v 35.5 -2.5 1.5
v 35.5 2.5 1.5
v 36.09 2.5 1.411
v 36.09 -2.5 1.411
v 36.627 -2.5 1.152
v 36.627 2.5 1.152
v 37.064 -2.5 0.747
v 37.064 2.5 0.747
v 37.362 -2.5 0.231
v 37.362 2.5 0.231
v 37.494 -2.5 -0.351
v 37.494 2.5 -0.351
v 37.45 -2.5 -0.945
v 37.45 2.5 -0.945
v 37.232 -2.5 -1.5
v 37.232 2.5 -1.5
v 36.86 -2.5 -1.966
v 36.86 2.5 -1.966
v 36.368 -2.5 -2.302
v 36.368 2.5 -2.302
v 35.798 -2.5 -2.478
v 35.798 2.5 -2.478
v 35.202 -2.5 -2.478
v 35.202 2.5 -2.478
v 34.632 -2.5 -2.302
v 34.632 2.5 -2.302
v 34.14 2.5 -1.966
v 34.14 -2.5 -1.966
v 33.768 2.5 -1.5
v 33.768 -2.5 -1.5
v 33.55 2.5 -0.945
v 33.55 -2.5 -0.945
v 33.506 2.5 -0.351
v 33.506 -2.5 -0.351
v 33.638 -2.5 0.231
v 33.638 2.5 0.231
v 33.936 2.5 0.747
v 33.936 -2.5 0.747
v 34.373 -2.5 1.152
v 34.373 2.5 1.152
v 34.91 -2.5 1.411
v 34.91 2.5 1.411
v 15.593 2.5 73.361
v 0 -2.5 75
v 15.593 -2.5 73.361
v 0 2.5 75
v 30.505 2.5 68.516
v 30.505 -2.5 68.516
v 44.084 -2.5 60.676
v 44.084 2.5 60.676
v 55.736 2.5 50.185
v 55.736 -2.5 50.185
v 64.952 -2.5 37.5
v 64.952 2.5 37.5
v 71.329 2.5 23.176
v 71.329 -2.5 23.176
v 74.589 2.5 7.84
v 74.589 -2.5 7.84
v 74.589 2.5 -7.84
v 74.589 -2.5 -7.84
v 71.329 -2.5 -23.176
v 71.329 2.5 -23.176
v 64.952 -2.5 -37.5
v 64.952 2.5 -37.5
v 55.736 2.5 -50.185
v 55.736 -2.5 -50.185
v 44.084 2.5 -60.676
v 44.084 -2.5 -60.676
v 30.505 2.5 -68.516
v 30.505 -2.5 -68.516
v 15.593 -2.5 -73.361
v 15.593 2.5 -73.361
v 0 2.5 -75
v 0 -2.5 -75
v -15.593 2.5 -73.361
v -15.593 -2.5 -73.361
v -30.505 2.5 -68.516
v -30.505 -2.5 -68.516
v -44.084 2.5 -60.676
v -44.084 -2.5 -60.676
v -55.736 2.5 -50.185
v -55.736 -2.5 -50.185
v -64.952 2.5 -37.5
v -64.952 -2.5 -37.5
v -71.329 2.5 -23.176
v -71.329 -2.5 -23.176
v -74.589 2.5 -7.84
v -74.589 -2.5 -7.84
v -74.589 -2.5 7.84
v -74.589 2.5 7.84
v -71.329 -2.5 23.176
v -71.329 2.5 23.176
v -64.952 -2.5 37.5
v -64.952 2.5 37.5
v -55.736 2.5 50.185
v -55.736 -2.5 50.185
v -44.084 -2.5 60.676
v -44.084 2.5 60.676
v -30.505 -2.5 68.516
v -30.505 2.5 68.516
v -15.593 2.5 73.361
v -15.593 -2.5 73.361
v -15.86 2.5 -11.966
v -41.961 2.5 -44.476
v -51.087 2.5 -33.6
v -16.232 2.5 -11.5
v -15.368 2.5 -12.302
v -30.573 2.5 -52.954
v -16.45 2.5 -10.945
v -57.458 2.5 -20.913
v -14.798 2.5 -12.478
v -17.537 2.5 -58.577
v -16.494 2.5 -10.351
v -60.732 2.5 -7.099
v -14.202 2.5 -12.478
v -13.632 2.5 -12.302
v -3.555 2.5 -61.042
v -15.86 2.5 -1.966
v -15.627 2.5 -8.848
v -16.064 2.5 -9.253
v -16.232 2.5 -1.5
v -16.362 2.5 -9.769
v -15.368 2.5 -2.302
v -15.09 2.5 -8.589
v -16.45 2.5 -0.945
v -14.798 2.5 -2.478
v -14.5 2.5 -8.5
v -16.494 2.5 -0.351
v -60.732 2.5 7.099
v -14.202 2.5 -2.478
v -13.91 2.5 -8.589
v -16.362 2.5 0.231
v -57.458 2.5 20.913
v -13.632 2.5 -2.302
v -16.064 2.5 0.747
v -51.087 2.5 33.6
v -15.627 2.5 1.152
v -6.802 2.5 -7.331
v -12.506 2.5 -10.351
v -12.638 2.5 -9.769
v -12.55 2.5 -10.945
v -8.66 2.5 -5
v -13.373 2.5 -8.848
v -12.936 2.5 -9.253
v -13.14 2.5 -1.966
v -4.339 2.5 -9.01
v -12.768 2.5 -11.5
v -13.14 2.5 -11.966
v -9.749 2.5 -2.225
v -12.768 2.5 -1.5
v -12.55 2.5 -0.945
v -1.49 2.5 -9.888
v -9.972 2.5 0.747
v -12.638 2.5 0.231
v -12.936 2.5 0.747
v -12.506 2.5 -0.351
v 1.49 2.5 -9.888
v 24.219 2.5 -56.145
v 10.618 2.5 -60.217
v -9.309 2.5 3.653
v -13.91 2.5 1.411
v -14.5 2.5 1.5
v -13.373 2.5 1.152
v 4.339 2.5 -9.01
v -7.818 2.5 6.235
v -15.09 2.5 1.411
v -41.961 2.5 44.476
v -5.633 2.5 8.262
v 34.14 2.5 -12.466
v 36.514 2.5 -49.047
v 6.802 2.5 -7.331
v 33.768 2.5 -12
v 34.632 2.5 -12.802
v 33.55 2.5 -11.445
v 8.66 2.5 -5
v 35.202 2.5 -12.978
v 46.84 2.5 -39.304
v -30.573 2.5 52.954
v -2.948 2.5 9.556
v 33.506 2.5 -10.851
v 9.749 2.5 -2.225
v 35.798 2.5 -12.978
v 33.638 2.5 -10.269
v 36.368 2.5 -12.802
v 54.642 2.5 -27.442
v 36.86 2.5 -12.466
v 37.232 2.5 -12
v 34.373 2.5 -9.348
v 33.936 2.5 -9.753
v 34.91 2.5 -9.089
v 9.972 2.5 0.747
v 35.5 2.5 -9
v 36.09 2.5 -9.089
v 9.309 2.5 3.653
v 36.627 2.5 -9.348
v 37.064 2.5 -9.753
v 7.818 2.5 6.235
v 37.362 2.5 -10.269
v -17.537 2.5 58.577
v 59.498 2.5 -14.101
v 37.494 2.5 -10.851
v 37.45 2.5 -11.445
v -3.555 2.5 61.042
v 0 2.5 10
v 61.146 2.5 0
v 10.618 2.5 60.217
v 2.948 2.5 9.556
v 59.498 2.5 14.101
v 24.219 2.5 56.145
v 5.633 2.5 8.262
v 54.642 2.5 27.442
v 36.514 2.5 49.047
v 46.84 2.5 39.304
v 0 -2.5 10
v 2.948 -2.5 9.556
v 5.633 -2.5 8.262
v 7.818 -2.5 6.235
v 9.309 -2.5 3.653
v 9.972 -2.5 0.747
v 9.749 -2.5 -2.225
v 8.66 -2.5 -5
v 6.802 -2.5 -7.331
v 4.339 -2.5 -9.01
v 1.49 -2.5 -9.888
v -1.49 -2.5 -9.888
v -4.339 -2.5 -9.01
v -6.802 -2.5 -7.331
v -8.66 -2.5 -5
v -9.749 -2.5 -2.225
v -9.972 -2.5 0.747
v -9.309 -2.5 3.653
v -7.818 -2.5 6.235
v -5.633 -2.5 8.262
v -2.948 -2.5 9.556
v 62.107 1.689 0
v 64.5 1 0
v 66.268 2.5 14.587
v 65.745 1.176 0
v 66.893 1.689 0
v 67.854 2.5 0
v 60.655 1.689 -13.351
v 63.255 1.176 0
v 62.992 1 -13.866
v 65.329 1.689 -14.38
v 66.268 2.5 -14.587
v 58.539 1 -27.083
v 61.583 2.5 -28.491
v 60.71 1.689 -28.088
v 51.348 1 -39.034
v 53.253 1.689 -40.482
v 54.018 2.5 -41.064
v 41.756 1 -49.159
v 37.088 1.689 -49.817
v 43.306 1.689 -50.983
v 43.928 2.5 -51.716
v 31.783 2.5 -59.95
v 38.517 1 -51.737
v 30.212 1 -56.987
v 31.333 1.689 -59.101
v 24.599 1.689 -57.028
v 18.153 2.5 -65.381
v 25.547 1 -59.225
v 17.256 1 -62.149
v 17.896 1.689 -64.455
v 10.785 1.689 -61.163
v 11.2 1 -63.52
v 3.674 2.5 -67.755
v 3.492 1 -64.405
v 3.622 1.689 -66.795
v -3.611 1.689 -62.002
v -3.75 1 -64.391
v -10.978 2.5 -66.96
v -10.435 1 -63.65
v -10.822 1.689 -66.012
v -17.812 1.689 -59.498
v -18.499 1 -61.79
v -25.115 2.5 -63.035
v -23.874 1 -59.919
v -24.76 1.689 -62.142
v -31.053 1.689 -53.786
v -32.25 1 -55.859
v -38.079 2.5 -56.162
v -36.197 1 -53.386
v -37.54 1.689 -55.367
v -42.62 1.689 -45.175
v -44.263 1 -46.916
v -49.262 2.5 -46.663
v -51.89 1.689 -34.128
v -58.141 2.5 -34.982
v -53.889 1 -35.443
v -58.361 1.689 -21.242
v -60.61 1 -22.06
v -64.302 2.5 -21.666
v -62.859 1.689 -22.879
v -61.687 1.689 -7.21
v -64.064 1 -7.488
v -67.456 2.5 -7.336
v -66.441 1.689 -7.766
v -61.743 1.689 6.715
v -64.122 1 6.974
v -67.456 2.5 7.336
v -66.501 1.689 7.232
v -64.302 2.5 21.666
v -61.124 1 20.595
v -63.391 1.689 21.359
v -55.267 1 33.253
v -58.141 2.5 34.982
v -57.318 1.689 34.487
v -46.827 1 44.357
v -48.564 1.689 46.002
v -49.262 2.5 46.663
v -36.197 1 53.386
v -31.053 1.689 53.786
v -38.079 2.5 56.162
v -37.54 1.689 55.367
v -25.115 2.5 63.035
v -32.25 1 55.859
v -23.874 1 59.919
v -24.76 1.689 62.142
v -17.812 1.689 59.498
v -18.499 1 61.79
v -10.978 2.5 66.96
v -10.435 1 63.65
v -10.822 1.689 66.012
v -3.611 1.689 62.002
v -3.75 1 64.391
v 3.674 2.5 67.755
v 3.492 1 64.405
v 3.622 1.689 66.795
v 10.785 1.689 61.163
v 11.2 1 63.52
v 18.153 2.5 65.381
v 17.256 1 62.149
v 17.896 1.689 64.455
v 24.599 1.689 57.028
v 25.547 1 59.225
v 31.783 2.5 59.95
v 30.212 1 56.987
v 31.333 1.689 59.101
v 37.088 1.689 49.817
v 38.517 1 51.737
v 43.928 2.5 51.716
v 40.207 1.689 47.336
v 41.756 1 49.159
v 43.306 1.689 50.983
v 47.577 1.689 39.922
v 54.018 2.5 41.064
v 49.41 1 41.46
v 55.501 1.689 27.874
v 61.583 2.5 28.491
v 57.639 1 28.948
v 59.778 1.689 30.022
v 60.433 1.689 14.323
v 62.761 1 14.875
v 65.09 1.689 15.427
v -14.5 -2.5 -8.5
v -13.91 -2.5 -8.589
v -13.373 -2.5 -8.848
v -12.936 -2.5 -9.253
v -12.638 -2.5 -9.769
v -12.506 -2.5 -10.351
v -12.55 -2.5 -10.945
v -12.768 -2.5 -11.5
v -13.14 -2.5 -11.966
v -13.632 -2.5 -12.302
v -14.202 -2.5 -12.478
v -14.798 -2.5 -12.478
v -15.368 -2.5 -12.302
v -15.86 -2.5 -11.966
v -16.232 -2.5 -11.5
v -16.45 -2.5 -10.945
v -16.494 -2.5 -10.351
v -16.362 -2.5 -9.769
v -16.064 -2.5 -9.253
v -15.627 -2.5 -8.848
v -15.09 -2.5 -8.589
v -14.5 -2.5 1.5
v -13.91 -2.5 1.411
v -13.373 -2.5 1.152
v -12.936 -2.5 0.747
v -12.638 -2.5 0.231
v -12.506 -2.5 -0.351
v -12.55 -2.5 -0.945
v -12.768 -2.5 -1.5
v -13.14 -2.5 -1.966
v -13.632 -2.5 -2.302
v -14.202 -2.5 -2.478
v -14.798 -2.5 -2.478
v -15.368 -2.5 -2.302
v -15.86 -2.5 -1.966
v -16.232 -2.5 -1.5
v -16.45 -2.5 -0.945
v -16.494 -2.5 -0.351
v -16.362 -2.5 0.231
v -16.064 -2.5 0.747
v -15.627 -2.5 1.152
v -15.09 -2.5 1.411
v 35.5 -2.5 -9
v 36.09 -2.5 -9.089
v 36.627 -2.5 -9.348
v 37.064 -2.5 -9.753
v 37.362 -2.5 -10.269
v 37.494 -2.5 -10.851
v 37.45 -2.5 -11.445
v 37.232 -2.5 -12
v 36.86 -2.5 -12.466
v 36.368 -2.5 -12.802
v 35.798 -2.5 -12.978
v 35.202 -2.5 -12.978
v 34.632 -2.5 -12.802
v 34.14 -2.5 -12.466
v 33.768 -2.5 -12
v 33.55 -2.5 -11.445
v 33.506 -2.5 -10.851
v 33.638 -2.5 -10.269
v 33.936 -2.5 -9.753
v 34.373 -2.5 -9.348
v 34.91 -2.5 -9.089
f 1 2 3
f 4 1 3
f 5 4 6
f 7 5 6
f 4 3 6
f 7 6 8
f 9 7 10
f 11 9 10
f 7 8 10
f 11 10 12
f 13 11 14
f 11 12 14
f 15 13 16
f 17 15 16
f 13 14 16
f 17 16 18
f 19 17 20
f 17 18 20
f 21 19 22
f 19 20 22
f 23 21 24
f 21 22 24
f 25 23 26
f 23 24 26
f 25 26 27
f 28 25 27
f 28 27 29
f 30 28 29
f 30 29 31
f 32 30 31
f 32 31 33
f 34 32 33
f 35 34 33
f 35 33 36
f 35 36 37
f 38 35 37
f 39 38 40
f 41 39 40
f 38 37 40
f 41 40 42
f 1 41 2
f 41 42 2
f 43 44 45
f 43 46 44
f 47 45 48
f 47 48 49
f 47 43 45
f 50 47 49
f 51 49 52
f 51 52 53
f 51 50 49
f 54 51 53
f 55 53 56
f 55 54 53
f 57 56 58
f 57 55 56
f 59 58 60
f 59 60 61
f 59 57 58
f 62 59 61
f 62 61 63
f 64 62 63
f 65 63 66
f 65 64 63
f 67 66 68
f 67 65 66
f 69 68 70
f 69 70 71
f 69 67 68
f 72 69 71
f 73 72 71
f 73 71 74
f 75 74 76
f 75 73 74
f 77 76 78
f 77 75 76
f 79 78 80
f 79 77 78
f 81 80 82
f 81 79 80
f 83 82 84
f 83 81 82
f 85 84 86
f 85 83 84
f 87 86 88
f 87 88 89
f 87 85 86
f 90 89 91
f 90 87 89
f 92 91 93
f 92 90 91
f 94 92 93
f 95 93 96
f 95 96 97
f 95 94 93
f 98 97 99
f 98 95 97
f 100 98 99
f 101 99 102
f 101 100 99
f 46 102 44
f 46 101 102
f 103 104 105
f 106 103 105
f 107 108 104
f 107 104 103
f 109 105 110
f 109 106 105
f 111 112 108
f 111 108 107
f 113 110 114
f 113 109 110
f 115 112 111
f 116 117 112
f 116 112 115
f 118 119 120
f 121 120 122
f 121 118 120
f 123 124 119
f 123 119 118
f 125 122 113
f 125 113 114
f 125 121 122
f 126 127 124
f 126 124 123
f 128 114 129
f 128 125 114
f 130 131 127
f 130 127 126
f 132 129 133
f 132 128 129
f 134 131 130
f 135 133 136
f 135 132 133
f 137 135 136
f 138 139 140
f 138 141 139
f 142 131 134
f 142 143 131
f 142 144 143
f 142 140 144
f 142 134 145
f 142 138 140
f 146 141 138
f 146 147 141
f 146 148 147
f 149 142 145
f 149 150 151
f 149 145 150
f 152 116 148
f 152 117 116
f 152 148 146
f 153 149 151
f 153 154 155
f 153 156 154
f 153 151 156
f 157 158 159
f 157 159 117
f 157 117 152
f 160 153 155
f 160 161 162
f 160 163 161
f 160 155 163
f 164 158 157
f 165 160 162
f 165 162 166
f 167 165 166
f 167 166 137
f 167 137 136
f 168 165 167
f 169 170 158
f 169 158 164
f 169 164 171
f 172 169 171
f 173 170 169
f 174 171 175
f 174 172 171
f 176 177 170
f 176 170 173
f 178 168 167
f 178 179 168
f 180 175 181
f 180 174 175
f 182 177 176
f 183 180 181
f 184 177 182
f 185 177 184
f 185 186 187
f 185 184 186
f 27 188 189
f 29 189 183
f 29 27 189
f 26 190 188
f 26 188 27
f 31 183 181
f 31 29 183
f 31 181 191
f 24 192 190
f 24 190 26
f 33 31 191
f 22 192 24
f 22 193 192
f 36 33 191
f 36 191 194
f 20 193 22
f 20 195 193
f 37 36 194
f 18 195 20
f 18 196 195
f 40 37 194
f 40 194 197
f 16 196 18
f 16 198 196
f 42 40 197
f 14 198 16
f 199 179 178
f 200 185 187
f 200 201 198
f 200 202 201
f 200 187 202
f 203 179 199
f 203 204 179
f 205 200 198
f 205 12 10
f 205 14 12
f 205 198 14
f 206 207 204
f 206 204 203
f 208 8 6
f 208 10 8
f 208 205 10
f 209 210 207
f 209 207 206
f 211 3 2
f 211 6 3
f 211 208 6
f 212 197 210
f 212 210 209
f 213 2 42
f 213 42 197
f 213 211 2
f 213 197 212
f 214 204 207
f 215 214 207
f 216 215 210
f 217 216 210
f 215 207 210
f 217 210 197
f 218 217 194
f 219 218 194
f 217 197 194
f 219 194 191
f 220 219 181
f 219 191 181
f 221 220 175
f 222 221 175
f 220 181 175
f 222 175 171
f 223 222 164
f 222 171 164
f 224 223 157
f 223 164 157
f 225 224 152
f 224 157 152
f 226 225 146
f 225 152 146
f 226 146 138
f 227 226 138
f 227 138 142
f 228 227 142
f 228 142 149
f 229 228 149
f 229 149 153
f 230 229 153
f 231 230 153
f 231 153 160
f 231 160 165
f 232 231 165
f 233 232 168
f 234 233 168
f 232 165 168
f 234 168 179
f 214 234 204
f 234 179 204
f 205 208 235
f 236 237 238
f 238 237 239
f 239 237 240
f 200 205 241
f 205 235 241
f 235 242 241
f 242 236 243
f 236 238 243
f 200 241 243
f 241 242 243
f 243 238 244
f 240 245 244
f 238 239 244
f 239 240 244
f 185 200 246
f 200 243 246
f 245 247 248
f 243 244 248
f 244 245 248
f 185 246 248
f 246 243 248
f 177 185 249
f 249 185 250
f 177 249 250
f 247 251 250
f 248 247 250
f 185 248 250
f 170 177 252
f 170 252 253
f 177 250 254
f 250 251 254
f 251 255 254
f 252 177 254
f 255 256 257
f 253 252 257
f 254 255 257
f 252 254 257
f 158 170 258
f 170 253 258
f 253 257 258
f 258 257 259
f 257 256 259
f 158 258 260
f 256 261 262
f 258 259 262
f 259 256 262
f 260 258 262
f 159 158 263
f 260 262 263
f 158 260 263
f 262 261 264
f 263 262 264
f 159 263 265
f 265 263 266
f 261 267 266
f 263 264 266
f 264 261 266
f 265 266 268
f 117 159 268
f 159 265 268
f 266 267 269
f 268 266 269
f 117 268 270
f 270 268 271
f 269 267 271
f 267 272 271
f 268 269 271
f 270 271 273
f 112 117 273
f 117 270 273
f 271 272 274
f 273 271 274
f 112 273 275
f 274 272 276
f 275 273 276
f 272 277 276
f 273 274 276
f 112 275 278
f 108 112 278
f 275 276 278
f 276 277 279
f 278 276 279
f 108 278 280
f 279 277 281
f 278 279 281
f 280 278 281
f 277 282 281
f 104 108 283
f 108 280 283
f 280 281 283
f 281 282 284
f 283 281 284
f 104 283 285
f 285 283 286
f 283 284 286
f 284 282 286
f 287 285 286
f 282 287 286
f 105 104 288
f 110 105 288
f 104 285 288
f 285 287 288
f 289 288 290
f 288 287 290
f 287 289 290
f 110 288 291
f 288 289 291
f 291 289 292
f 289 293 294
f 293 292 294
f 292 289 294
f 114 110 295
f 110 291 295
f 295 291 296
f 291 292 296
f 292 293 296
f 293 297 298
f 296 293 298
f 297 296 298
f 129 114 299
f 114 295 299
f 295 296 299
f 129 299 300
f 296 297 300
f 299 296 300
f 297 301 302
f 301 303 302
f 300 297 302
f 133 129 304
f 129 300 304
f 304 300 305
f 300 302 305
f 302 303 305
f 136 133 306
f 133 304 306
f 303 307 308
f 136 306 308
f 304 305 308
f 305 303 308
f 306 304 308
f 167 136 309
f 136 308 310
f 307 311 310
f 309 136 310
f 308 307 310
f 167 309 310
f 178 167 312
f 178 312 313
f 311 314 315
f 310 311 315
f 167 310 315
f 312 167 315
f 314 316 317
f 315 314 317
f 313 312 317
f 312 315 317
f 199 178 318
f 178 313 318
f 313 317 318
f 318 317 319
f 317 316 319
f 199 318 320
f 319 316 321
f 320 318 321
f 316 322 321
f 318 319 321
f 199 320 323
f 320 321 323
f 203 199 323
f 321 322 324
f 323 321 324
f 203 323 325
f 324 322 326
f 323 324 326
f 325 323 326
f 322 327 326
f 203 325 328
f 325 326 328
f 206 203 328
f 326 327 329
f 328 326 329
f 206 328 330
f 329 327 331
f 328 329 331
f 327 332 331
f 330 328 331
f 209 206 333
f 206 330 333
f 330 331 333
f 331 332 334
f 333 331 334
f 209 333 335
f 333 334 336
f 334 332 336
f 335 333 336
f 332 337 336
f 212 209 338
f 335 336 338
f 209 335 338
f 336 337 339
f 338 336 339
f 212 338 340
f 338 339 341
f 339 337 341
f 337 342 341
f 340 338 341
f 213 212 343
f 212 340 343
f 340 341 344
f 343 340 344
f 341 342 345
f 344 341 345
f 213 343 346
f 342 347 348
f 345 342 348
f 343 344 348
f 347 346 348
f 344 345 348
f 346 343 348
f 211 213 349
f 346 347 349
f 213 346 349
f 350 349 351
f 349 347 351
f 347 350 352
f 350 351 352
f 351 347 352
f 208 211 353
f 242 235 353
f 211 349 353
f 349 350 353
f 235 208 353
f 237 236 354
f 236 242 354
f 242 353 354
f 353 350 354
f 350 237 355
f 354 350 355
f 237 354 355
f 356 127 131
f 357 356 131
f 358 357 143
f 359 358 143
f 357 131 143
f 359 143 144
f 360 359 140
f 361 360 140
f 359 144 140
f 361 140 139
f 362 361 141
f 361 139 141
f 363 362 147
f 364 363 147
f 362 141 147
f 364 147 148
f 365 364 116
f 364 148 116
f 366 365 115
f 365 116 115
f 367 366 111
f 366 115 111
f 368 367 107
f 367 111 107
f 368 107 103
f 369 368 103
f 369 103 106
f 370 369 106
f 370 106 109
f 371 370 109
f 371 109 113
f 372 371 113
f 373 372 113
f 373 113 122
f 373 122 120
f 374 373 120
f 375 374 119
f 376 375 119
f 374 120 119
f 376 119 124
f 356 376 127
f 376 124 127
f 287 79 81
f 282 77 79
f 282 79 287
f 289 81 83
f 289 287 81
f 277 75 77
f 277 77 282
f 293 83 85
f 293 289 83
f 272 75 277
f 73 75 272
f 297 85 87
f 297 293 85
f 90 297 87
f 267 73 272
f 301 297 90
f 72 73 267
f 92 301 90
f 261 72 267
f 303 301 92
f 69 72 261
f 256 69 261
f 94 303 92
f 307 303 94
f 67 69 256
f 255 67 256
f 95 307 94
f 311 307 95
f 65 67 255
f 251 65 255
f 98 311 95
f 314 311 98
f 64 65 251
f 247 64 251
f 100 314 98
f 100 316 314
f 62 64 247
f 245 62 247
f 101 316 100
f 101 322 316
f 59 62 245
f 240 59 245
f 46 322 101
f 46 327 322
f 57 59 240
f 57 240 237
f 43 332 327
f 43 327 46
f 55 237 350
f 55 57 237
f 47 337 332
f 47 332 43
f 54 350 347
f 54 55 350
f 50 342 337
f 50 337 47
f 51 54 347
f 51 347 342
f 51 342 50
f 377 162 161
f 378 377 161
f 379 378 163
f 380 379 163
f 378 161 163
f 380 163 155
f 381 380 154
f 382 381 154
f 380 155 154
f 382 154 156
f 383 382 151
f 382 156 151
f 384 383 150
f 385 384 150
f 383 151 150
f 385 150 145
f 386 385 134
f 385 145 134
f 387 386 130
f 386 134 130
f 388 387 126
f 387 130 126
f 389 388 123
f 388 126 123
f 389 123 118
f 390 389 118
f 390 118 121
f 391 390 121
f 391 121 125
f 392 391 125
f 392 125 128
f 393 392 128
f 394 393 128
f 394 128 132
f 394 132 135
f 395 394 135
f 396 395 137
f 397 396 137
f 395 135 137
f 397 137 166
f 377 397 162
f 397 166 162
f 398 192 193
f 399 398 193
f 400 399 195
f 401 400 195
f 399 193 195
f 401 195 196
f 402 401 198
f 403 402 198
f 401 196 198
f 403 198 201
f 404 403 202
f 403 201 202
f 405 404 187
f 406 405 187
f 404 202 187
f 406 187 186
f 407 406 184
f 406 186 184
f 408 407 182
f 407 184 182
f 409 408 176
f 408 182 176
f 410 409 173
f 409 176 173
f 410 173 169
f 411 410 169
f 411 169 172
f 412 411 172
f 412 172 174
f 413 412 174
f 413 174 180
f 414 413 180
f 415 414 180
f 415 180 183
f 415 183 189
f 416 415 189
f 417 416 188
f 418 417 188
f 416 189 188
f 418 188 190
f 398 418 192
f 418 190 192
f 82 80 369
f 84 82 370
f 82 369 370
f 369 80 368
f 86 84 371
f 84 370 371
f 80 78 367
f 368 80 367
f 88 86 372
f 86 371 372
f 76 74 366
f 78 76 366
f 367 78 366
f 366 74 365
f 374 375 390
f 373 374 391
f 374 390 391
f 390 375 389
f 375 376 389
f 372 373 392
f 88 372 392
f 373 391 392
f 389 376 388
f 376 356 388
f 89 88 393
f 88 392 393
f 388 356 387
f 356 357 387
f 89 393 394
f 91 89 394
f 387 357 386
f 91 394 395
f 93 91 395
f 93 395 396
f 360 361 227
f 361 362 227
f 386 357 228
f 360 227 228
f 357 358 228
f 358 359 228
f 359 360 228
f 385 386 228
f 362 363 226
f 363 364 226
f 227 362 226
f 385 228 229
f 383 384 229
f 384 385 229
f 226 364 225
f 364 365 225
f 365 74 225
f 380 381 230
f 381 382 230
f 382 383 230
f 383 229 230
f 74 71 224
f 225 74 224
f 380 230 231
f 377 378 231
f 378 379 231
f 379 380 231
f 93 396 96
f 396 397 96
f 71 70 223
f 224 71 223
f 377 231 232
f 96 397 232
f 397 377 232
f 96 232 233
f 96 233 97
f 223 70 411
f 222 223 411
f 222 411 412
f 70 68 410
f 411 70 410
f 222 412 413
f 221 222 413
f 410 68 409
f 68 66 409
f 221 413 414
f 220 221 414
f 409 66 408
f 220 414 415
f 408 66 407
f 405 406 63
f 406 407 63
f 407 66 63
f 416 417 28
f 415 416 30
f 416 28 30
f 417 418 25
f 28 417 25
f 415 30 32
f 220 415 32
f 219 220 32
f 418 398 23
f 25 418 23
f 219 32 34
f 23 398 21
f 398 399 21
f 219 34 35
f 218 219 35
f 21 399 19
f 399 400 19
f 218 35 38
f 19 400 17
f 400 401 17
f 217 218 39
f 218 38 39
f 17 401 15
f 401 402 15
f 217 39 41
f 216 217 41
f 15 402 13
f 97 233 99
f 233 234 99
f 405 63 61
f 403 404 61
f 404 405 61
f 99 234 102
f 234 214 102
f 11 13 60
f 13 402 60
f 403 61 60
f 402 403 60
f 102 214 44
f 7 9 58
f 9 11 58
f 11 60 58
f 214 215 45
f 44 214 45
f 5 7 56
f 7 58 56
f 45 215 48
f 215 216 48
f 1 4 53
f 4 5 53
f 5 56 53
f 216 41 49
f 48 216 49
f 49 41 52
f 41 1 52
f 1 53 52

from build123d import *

# Parameters (mm, degrees)
CROQUIS1_R              = 75
SALIENTE_EXTRUIR1_DEPTH = 2.5
CROQUIS2_R              = 10
CORTAR_EXTRUIR1_DEPTH   = 5
CROQUIS5_R              = 4.5
CROQUIS3_R              = 2
CORTAR_EXTRUIR4_DEPTH   = 5


with BuildPart() as part:
    # Croquis1 → Saliente-Extruir1 (new, symmetric)
    with BuildSketch(Plane(origin=(0, 0, 0), x_dir=(1, 0, 0), z_dir=(0, 1, 0))):
        with Locations(Location((0, 0, 0), (0, 0, 270))):
            Circle(CROQUIS1_R)
    extrude(amount=SALIENTE_EXTRUIR1_DEPTH, both=True)

    # Croquis2 → Cortar-Extruir1 (cut)
    with BuildSketch(Plane(origin=(0, 2.5, 0), x_dir=(1, 0, 0), z_dir=(0, 1, 0))):
        with Locations(Location((0, 0, 0), (0, 0, 270))):
            Circle(CROQUIS2_R)
    extrude(amount=-CORTAR_EXTRUIR1_DEPTH, mode=Mode.SUBTRACT)

    # Cortar-Barrer1: sweep along a path in Croquis4
    with BuildLine(Plane(origin=(0, 2.5, 0), x_dir=(1, 0, 0), z_dir=(0, 1, 0))) as cortar_barrer1_path:
        CenterArc((0, 0), 64.5, 0, 360)
    # Croquis5 → Cortar-Barrer1 (sweep, cut)
    with BuildSketch(Plane(origin=(0, 0, 0), x_dir=(0, 0, -1), z_dir=(1, 0, 0))):
        with Locations((64.5, 5.5)):
            Circle(CROQUIS5_R)
    sweep(path=cortar_barrer1_path.line, mode=Mode.SUBTRACT)

    # Croquis3 → Cortar-Extruir4 (cut)
    with BuildSketch(Plane(origin=(0, 2.5, 0), x_dir=(1, 0, 0), z_dir=(0, 1, 0))):
        with Locations(Location((-14.5, 10.5, 0), (0, 0, 270))):
            Circle(CROQUIS3_R)
        with Locations(Location((-14.5, 0.5, 0), (0, 0, 270))):
            Circle(CROQUIS3_R)
        with Locations(Location((35.5, 11, 0), (0, 0, 270))):
            Circle(CROQUIS3_R)
        with Locations(Location((35.5, 0.5, 0), (0, 0, 270))):
            Circle(CROQUIS3_R)
    extrude(amount=-CORTAR_EXTRUIR4_DEPTH, mode=Mode.SUBTRACT)


solid = part.part
